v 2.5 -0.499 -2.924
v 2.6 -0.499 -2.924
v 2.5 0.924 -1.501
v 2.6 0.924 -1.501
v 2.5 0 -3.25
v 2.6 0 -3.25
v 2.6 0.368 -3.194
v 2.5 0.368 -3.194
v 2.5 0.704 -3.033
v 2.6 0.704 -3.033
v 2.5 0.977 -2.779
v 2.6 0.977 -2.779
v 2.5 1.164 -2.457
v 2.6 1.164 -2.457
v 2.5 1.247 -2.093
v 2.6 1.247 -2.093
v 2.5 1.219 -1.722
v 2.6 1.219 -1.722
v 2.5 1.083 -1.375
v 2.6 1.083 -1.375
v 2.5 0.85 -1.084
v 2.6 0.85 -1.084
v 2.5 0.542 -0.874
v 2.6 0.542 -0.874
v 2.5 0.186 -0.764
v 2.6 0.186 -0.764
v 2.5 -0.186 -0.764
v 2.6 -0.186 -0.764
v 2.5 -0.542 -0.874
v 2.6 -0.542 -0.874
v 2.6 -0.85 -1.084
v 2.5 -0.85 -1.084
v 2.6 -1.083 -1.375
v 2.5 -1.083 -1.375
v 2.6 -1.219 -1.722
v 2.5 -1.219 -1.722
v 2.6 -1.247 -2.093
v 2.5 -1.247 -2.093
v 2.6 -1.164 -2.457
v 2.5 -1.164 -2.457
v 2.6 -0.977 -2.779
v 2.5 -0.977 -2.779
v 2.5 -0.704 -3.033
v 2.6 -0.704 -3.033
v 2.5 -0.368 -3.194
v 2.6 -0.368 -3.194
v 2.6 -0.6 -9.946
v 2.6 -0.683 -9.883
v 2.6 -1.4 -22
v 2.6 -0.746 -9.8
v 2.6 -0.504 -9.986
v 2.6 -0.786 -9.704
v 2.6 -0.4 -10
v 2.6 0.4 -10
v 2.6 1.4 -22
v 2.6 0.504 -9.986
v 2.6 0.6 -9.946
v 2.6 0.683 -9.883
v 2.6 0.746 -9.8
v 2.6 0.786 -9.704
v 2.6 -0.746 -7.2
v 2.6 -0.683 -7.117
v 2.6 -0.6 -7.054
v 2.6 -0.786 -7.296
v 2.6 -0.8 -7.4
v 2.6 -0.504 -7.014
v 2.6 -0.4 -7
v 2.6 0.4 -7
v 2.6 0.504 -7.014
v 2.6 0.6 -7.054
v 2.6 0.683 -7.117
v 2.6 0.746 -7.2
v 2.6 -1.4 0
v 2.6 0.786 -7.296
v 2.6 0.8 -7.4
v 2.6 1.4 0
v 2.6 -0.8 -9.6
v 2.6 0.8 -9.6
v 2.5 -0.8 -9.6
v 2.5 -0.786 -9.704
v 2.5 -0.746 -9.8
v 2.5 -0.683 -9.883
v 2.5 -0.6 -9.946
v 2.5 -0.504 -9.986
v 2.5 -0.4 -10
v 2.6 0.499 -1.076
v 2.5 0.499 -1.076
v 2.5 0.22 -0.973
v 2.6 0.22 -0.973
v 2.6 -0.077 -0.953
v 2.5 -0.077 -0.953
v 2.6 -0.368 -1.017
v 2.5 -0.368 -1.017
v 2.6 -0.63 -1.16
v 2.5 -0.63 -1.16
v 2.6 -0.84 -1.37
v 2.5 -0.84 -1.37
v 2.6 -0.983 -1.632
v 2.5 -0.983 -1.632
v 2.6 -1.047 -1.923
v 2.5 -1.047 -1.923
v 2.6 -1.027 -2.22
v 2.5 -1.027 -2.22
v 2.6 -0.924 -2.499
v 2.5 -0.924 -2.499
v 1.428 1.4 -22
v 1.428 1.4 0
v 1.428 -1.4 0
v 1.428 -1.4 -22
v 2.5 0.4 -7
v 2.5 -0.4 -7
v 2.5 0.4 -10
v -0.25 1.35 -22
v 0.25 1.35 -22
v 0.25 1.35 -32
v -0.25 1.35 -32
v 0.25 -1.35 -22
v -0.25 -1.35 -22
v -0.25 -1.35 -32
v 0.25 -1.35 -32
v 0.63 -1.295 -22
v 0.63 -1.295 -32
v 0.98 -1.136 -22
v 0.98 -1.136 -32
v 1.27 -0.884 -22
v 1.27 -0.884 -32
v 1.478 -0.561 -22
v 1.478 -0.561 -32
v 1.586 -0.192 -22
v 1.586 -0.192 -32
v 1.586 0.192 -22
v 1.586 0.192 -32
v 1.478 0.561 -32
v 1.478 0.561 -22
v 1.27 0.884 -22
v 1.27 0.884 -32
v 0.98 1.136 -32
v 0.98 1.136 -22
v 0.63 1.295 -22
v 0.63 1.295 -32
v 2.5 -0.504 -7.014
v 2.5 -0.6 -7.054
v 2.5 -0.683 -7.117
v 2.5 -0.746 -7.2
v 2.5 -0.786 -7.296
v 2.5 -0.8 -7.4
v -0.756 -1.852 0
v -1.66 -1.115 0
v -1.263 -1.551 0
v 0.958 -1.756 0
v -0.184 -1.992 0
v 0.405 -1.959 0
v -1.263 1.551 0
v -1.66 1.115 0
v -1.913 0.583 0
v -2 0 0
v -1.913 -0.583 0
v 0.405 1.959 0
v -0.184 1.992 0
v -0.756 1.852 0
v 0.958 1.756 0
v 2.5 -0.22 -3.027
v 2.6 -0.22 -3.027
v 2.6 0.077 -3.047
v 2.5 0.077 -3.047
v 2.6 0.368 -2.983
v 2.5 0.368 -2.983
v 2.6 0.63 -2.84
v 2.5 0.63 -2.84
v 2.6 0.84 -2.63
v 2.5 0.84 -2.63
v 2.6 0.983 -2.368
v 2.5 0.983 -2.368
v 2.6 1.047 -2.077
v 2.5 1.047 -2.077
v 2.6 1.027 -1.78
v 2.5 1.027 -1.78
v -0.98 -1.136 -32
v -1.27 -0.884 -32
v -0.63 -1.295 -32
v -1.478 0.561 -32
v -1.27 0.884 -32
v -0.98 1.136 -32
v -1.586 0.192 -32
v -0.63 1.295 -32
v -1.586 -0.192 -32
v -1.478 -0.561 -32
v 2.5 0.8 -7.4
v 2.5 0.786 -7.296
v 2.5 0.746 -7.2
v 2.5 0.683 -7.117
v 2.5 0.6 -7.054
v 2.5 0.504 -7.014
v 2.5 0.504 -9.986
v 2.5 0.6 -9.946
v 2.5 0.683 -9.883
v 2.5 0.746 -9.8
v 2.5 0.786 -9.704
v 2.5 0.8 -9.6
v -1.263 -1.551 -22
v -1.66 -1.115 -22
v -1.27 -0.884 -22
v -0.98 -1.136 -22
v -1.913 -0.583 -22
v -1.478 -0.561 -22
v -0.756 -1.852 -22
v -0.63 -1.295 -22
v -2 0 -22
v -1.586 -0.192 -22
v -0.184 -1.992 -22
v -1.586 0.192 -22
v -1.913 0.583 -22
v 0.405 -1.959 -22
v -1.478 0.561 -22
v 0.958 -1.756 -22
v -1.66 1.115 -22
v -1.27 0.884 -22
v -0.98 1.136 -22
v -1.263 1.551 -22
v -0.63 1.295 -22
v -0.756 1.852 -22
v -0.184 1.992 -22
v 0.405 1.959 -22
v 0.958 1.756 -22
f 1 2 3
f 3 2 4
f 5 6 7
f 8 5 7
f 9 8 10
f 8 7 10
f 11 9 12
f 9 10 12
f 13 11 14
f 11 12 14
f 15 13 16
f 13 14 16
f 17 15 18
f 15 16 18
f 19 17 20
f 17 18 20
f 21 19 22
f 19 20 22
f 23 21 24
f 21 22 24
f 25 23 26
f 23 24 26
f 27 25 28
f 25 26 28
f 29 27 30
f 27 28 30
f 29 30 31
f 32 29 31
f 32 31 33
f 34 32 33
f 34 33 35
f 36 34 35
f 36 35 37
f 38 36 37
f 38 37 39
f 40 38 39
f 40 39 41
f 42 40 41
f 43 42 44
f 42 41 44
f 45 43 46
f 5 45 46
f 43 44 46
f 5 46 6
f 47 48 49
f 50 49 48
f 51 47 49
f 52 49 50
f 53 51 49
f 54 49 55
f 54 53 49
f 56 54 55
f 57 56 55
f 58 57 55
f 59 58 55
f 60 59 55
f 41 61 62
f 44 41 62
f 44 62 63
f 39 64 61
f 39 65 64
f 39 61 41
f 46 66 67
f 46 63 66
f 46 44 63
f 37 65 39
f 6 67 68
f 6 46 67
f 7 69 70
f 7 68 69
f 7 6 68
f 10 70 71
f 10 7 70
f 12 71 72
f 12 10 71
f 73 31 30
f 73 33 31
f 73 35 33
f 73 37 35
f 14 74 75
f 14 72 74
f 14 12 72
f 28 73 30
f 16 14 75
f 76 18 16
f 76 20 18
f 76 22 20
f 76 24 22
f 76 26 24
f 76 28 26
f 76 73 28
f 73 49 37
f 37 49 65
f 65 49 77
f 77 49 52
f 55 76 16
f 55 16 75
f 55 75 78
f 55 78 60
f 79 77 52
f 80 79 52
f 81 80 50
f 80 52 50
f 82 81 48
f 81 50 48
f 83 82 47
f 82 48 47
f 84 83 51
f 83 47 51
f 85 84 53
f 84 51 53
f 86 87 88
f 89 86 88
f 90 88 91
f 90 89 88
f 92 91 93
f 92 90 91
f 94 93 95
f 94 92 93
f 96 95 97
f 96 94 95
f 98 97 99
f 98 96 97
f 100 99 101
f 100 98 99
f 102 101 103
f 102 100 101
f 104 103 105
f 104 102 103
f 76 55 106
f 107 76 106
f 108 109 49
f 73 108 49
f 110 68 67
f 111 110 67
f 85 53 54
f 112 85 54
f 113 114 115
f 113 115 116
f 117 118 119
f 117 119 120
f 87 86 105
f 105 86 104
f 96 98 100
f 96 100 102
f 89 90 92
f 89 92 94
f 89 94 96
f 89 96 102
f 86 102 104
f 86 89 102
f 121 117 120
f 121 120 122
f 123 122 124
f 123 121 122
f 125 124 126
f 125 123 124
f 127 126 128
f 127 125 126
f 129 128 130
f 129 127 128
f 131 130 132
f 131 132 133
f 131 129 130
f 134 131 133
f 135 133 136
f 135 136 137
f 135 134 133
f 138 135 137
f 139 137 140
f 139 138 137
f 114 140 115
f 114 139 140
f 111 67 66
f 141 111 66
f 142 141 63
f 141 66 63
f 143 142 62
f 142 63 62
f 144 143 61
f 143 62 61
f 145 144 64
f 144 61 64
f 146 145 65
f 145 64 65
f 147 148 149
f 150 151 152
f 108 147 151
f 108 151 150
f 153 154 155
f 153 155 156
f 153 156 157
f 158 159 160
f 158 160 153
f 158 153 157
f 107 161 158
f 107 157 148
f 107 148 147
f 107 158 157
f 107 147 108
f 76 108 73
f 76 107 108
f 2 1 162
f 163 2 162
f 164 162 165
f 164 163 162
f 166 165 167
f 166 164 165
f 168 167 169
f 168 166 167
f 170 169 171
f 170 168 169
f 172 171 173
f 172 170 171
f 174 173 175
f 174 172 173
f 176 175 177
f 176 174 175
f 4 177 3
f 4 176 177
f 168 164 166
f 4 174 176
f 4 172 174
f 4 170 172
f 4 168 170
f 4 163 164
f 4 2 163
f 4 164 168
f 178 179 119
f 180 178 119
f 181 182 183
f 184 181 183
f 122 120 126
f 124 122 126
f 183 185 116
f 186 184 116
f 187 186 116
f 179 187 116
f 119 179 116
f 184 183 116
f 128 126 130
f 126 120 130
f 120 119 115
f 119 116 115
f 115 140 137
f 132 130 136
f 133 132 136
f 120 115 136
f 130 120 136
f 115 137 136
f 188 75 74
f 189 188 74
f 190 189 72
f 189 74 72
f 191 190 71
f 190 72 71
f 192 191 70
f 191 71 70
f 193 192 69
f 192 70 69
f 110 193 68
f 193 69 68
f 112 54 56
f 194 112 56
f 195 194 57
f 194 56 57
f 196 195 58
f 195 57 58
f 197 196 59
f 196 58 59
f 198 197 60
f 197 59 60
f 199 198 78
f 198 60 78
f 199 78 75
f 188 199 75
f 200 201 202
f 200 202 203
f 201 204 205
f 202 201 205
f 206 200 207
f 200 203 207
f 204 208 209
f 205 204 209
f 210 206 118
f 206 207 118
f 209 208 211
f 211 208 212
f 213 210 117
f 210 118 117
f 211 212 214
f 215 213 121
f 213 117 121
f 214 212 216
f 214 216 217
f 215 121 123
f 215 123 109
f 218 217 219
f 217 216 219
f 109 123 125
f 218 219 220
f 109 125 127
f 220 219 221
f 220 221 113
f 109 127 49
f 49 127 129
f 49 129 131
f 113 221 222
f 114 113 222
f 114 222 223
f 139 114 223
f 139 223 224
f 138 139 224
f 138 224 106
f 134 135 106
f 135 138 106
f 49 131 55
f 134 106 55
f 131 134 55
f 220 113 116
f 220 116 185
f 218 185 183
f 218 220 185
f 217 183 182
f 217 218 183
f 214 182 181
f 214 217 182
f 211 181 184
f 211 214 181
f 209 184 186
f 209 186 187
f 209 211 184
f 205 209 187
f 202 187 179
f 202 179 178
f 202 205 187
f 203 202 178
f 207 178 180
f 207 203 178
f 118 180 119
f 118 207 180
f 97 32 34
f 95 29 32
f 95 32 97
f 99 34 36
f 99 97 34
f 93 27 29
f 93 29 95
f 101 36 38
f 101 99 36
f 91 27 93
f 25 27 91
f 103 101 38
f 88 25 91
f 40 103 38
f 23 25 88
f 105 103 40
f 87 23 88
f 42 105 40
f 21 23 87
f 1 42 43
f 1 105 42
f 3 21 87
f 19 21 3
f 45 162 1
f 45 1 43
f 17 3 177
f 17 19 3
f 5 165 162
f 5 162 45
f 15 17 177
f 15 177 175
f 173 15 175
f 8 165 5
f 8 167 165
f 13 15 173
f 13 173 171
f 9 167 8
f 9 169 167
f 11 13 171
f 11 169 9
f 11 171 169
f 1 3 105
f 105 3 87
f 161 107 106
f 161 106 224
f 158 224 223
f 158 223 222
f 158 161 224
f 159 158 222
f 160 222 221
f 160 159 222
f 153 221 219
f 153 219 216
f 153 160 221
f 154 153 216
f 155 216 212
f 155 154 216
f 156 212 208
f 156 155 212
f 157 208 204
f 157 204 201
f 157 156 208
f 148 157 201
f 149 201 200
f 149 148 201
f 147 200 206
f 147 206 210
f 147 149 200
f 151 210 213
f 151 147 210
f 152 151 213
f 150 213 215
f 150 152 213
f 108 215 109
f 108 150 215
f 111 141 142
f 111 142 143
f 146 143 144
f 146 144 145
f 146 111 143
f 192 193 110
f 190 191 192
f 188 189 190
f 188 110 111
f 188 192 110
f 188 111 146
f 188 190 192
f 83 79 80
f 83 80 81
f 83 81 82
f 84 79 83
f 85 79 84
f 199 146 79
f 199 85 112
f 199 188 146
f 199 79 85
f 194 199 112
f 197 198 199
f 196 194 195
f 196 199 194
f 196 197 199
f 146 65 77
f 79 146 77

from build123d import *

# Parameters (mm, degrees)
EXTRUDE_1_DEPTH     = 22
EXTRUDE_2_DEPTH     = 10
SKETCH_3_R          = 1.25
SKETCH_3_R_2        = 1.05
CUT_EXTRUDE_1_DEPTH = 0.1
CUT_EXTRUDE_2_DEPTH = 0.1
CUT_EXTRUDE_3_DEPTH = 0.1


with BuildPart() as part:
    # 草图1 → 凸台-拉伸1 (new body)
    with BuildSketch(Plane.XY):
        with BuildLine():
            Line((1.428285686, -1.4), (2.6, -1.4))
            Line((2.6, -1.4), (2.6, 1.4))
            Line((2.6, 1.4), (1.428285686, 1.4))
            ThreePointArc((1.428285686, 1.4), (-2, 0), (1.428285686, -1.4))
        make_face()
    extrude(amount=-EXTRUDE_1_DEPTH)

    # 草图2 → 凸台-拉伸2 (add)
    with BuildSketch(Plane.XY.offset(-22)):
        with BuildLine():
            Line((-0.25, -1.35), (0.25, -1.35))
            ThreePointArc((0.25, -1.35), (1.6, 0), (0.25, 1.35))
            Line((0.25, 1.35), (-0.25, 1.35))
            ThreePointArc((-0.25, 1.35), (-1.6, 0), (-0.25, -1.35))
        make_face()
    extrude(amount=-EXTRUDE_2_DEPTH)

    # 草图3 → 切除-拉伸1 (cut)
    with BuildSketch(Plane(origin=(2.6, 0, 0), x_dir=(0, 0, -1), z_dir=(1, 0, 0))):
        with Locations((2, 0)):
            Circle(SKETCH_3_R)
        with Locations((2, 0)):
            Circle(SKETCH_3_R_2, mode=Mode.SUBTRACT)
    extrude(amount=-CUT_EXTRUDE_1_DEPTH, mode=Mode.SUBTRACT)

    # 草图4 → 切除-拉伸2 (cut)
    with BuildSketch(Plane(origin=(2.6, 0, 0), x_dir=(0, 0, -1), z_dir=(1, 0, 0))):
        with BuildLine():
            Line((7.4, -0.8), (9.6, -0.8))
            ThreePointArc((9.6, -0.8), (9.882842712, -0.682842712), (10, -0.4))
            Line((10, -0.4), (10, 0.4))
            ThreePointArc((10, 0.4), (9.882842712, 0.682842712), (9.6, 0.8))
            Line((9.6, 0.8), (7.4, 0.8))
            ThreePointArc((7.4, 0.8), (7.117157288, 0.682842712), (7, 0.4))
            Line((7, 0.4), (7, -0.4))
            ThreePointArc((7, -0.4), (7.117157288, -0.682842712), (7.4, -0.8))
        make_face()
    extrude(amount=-CUT_EXTRUDE_2_DEPTH, mode=Mode.SUBTRACT)

    # 草图5 → 切除-拉伸3 (cut)
    with BuildSketch(Plane(origin=(2.6, 0, 0), x_dir=(0, 0, -1), z_dir=(1, 0, 0))):
        with BuildLine():
            Line((0.966284129, 0.609451802), (2.609451802, -1.033715871))
            ThreePointArc((2.609451802, -1.033715871), (2.848528137, -0.848528137), (3.033715871, -0.609451802))
            Line((3.033715871, -0.609451802), (1.390548198, 1.033715871))
            ThreePointArc((1.390548198, 1.033715871), (1.151471863, 0.848528137), (0.966284129, 0.609451802))
        make_face()
    extrude(amount=-CUT_EXTRUDE_3_DEPTH, mode=Mode.SUBTRACT)


solid = part.part
